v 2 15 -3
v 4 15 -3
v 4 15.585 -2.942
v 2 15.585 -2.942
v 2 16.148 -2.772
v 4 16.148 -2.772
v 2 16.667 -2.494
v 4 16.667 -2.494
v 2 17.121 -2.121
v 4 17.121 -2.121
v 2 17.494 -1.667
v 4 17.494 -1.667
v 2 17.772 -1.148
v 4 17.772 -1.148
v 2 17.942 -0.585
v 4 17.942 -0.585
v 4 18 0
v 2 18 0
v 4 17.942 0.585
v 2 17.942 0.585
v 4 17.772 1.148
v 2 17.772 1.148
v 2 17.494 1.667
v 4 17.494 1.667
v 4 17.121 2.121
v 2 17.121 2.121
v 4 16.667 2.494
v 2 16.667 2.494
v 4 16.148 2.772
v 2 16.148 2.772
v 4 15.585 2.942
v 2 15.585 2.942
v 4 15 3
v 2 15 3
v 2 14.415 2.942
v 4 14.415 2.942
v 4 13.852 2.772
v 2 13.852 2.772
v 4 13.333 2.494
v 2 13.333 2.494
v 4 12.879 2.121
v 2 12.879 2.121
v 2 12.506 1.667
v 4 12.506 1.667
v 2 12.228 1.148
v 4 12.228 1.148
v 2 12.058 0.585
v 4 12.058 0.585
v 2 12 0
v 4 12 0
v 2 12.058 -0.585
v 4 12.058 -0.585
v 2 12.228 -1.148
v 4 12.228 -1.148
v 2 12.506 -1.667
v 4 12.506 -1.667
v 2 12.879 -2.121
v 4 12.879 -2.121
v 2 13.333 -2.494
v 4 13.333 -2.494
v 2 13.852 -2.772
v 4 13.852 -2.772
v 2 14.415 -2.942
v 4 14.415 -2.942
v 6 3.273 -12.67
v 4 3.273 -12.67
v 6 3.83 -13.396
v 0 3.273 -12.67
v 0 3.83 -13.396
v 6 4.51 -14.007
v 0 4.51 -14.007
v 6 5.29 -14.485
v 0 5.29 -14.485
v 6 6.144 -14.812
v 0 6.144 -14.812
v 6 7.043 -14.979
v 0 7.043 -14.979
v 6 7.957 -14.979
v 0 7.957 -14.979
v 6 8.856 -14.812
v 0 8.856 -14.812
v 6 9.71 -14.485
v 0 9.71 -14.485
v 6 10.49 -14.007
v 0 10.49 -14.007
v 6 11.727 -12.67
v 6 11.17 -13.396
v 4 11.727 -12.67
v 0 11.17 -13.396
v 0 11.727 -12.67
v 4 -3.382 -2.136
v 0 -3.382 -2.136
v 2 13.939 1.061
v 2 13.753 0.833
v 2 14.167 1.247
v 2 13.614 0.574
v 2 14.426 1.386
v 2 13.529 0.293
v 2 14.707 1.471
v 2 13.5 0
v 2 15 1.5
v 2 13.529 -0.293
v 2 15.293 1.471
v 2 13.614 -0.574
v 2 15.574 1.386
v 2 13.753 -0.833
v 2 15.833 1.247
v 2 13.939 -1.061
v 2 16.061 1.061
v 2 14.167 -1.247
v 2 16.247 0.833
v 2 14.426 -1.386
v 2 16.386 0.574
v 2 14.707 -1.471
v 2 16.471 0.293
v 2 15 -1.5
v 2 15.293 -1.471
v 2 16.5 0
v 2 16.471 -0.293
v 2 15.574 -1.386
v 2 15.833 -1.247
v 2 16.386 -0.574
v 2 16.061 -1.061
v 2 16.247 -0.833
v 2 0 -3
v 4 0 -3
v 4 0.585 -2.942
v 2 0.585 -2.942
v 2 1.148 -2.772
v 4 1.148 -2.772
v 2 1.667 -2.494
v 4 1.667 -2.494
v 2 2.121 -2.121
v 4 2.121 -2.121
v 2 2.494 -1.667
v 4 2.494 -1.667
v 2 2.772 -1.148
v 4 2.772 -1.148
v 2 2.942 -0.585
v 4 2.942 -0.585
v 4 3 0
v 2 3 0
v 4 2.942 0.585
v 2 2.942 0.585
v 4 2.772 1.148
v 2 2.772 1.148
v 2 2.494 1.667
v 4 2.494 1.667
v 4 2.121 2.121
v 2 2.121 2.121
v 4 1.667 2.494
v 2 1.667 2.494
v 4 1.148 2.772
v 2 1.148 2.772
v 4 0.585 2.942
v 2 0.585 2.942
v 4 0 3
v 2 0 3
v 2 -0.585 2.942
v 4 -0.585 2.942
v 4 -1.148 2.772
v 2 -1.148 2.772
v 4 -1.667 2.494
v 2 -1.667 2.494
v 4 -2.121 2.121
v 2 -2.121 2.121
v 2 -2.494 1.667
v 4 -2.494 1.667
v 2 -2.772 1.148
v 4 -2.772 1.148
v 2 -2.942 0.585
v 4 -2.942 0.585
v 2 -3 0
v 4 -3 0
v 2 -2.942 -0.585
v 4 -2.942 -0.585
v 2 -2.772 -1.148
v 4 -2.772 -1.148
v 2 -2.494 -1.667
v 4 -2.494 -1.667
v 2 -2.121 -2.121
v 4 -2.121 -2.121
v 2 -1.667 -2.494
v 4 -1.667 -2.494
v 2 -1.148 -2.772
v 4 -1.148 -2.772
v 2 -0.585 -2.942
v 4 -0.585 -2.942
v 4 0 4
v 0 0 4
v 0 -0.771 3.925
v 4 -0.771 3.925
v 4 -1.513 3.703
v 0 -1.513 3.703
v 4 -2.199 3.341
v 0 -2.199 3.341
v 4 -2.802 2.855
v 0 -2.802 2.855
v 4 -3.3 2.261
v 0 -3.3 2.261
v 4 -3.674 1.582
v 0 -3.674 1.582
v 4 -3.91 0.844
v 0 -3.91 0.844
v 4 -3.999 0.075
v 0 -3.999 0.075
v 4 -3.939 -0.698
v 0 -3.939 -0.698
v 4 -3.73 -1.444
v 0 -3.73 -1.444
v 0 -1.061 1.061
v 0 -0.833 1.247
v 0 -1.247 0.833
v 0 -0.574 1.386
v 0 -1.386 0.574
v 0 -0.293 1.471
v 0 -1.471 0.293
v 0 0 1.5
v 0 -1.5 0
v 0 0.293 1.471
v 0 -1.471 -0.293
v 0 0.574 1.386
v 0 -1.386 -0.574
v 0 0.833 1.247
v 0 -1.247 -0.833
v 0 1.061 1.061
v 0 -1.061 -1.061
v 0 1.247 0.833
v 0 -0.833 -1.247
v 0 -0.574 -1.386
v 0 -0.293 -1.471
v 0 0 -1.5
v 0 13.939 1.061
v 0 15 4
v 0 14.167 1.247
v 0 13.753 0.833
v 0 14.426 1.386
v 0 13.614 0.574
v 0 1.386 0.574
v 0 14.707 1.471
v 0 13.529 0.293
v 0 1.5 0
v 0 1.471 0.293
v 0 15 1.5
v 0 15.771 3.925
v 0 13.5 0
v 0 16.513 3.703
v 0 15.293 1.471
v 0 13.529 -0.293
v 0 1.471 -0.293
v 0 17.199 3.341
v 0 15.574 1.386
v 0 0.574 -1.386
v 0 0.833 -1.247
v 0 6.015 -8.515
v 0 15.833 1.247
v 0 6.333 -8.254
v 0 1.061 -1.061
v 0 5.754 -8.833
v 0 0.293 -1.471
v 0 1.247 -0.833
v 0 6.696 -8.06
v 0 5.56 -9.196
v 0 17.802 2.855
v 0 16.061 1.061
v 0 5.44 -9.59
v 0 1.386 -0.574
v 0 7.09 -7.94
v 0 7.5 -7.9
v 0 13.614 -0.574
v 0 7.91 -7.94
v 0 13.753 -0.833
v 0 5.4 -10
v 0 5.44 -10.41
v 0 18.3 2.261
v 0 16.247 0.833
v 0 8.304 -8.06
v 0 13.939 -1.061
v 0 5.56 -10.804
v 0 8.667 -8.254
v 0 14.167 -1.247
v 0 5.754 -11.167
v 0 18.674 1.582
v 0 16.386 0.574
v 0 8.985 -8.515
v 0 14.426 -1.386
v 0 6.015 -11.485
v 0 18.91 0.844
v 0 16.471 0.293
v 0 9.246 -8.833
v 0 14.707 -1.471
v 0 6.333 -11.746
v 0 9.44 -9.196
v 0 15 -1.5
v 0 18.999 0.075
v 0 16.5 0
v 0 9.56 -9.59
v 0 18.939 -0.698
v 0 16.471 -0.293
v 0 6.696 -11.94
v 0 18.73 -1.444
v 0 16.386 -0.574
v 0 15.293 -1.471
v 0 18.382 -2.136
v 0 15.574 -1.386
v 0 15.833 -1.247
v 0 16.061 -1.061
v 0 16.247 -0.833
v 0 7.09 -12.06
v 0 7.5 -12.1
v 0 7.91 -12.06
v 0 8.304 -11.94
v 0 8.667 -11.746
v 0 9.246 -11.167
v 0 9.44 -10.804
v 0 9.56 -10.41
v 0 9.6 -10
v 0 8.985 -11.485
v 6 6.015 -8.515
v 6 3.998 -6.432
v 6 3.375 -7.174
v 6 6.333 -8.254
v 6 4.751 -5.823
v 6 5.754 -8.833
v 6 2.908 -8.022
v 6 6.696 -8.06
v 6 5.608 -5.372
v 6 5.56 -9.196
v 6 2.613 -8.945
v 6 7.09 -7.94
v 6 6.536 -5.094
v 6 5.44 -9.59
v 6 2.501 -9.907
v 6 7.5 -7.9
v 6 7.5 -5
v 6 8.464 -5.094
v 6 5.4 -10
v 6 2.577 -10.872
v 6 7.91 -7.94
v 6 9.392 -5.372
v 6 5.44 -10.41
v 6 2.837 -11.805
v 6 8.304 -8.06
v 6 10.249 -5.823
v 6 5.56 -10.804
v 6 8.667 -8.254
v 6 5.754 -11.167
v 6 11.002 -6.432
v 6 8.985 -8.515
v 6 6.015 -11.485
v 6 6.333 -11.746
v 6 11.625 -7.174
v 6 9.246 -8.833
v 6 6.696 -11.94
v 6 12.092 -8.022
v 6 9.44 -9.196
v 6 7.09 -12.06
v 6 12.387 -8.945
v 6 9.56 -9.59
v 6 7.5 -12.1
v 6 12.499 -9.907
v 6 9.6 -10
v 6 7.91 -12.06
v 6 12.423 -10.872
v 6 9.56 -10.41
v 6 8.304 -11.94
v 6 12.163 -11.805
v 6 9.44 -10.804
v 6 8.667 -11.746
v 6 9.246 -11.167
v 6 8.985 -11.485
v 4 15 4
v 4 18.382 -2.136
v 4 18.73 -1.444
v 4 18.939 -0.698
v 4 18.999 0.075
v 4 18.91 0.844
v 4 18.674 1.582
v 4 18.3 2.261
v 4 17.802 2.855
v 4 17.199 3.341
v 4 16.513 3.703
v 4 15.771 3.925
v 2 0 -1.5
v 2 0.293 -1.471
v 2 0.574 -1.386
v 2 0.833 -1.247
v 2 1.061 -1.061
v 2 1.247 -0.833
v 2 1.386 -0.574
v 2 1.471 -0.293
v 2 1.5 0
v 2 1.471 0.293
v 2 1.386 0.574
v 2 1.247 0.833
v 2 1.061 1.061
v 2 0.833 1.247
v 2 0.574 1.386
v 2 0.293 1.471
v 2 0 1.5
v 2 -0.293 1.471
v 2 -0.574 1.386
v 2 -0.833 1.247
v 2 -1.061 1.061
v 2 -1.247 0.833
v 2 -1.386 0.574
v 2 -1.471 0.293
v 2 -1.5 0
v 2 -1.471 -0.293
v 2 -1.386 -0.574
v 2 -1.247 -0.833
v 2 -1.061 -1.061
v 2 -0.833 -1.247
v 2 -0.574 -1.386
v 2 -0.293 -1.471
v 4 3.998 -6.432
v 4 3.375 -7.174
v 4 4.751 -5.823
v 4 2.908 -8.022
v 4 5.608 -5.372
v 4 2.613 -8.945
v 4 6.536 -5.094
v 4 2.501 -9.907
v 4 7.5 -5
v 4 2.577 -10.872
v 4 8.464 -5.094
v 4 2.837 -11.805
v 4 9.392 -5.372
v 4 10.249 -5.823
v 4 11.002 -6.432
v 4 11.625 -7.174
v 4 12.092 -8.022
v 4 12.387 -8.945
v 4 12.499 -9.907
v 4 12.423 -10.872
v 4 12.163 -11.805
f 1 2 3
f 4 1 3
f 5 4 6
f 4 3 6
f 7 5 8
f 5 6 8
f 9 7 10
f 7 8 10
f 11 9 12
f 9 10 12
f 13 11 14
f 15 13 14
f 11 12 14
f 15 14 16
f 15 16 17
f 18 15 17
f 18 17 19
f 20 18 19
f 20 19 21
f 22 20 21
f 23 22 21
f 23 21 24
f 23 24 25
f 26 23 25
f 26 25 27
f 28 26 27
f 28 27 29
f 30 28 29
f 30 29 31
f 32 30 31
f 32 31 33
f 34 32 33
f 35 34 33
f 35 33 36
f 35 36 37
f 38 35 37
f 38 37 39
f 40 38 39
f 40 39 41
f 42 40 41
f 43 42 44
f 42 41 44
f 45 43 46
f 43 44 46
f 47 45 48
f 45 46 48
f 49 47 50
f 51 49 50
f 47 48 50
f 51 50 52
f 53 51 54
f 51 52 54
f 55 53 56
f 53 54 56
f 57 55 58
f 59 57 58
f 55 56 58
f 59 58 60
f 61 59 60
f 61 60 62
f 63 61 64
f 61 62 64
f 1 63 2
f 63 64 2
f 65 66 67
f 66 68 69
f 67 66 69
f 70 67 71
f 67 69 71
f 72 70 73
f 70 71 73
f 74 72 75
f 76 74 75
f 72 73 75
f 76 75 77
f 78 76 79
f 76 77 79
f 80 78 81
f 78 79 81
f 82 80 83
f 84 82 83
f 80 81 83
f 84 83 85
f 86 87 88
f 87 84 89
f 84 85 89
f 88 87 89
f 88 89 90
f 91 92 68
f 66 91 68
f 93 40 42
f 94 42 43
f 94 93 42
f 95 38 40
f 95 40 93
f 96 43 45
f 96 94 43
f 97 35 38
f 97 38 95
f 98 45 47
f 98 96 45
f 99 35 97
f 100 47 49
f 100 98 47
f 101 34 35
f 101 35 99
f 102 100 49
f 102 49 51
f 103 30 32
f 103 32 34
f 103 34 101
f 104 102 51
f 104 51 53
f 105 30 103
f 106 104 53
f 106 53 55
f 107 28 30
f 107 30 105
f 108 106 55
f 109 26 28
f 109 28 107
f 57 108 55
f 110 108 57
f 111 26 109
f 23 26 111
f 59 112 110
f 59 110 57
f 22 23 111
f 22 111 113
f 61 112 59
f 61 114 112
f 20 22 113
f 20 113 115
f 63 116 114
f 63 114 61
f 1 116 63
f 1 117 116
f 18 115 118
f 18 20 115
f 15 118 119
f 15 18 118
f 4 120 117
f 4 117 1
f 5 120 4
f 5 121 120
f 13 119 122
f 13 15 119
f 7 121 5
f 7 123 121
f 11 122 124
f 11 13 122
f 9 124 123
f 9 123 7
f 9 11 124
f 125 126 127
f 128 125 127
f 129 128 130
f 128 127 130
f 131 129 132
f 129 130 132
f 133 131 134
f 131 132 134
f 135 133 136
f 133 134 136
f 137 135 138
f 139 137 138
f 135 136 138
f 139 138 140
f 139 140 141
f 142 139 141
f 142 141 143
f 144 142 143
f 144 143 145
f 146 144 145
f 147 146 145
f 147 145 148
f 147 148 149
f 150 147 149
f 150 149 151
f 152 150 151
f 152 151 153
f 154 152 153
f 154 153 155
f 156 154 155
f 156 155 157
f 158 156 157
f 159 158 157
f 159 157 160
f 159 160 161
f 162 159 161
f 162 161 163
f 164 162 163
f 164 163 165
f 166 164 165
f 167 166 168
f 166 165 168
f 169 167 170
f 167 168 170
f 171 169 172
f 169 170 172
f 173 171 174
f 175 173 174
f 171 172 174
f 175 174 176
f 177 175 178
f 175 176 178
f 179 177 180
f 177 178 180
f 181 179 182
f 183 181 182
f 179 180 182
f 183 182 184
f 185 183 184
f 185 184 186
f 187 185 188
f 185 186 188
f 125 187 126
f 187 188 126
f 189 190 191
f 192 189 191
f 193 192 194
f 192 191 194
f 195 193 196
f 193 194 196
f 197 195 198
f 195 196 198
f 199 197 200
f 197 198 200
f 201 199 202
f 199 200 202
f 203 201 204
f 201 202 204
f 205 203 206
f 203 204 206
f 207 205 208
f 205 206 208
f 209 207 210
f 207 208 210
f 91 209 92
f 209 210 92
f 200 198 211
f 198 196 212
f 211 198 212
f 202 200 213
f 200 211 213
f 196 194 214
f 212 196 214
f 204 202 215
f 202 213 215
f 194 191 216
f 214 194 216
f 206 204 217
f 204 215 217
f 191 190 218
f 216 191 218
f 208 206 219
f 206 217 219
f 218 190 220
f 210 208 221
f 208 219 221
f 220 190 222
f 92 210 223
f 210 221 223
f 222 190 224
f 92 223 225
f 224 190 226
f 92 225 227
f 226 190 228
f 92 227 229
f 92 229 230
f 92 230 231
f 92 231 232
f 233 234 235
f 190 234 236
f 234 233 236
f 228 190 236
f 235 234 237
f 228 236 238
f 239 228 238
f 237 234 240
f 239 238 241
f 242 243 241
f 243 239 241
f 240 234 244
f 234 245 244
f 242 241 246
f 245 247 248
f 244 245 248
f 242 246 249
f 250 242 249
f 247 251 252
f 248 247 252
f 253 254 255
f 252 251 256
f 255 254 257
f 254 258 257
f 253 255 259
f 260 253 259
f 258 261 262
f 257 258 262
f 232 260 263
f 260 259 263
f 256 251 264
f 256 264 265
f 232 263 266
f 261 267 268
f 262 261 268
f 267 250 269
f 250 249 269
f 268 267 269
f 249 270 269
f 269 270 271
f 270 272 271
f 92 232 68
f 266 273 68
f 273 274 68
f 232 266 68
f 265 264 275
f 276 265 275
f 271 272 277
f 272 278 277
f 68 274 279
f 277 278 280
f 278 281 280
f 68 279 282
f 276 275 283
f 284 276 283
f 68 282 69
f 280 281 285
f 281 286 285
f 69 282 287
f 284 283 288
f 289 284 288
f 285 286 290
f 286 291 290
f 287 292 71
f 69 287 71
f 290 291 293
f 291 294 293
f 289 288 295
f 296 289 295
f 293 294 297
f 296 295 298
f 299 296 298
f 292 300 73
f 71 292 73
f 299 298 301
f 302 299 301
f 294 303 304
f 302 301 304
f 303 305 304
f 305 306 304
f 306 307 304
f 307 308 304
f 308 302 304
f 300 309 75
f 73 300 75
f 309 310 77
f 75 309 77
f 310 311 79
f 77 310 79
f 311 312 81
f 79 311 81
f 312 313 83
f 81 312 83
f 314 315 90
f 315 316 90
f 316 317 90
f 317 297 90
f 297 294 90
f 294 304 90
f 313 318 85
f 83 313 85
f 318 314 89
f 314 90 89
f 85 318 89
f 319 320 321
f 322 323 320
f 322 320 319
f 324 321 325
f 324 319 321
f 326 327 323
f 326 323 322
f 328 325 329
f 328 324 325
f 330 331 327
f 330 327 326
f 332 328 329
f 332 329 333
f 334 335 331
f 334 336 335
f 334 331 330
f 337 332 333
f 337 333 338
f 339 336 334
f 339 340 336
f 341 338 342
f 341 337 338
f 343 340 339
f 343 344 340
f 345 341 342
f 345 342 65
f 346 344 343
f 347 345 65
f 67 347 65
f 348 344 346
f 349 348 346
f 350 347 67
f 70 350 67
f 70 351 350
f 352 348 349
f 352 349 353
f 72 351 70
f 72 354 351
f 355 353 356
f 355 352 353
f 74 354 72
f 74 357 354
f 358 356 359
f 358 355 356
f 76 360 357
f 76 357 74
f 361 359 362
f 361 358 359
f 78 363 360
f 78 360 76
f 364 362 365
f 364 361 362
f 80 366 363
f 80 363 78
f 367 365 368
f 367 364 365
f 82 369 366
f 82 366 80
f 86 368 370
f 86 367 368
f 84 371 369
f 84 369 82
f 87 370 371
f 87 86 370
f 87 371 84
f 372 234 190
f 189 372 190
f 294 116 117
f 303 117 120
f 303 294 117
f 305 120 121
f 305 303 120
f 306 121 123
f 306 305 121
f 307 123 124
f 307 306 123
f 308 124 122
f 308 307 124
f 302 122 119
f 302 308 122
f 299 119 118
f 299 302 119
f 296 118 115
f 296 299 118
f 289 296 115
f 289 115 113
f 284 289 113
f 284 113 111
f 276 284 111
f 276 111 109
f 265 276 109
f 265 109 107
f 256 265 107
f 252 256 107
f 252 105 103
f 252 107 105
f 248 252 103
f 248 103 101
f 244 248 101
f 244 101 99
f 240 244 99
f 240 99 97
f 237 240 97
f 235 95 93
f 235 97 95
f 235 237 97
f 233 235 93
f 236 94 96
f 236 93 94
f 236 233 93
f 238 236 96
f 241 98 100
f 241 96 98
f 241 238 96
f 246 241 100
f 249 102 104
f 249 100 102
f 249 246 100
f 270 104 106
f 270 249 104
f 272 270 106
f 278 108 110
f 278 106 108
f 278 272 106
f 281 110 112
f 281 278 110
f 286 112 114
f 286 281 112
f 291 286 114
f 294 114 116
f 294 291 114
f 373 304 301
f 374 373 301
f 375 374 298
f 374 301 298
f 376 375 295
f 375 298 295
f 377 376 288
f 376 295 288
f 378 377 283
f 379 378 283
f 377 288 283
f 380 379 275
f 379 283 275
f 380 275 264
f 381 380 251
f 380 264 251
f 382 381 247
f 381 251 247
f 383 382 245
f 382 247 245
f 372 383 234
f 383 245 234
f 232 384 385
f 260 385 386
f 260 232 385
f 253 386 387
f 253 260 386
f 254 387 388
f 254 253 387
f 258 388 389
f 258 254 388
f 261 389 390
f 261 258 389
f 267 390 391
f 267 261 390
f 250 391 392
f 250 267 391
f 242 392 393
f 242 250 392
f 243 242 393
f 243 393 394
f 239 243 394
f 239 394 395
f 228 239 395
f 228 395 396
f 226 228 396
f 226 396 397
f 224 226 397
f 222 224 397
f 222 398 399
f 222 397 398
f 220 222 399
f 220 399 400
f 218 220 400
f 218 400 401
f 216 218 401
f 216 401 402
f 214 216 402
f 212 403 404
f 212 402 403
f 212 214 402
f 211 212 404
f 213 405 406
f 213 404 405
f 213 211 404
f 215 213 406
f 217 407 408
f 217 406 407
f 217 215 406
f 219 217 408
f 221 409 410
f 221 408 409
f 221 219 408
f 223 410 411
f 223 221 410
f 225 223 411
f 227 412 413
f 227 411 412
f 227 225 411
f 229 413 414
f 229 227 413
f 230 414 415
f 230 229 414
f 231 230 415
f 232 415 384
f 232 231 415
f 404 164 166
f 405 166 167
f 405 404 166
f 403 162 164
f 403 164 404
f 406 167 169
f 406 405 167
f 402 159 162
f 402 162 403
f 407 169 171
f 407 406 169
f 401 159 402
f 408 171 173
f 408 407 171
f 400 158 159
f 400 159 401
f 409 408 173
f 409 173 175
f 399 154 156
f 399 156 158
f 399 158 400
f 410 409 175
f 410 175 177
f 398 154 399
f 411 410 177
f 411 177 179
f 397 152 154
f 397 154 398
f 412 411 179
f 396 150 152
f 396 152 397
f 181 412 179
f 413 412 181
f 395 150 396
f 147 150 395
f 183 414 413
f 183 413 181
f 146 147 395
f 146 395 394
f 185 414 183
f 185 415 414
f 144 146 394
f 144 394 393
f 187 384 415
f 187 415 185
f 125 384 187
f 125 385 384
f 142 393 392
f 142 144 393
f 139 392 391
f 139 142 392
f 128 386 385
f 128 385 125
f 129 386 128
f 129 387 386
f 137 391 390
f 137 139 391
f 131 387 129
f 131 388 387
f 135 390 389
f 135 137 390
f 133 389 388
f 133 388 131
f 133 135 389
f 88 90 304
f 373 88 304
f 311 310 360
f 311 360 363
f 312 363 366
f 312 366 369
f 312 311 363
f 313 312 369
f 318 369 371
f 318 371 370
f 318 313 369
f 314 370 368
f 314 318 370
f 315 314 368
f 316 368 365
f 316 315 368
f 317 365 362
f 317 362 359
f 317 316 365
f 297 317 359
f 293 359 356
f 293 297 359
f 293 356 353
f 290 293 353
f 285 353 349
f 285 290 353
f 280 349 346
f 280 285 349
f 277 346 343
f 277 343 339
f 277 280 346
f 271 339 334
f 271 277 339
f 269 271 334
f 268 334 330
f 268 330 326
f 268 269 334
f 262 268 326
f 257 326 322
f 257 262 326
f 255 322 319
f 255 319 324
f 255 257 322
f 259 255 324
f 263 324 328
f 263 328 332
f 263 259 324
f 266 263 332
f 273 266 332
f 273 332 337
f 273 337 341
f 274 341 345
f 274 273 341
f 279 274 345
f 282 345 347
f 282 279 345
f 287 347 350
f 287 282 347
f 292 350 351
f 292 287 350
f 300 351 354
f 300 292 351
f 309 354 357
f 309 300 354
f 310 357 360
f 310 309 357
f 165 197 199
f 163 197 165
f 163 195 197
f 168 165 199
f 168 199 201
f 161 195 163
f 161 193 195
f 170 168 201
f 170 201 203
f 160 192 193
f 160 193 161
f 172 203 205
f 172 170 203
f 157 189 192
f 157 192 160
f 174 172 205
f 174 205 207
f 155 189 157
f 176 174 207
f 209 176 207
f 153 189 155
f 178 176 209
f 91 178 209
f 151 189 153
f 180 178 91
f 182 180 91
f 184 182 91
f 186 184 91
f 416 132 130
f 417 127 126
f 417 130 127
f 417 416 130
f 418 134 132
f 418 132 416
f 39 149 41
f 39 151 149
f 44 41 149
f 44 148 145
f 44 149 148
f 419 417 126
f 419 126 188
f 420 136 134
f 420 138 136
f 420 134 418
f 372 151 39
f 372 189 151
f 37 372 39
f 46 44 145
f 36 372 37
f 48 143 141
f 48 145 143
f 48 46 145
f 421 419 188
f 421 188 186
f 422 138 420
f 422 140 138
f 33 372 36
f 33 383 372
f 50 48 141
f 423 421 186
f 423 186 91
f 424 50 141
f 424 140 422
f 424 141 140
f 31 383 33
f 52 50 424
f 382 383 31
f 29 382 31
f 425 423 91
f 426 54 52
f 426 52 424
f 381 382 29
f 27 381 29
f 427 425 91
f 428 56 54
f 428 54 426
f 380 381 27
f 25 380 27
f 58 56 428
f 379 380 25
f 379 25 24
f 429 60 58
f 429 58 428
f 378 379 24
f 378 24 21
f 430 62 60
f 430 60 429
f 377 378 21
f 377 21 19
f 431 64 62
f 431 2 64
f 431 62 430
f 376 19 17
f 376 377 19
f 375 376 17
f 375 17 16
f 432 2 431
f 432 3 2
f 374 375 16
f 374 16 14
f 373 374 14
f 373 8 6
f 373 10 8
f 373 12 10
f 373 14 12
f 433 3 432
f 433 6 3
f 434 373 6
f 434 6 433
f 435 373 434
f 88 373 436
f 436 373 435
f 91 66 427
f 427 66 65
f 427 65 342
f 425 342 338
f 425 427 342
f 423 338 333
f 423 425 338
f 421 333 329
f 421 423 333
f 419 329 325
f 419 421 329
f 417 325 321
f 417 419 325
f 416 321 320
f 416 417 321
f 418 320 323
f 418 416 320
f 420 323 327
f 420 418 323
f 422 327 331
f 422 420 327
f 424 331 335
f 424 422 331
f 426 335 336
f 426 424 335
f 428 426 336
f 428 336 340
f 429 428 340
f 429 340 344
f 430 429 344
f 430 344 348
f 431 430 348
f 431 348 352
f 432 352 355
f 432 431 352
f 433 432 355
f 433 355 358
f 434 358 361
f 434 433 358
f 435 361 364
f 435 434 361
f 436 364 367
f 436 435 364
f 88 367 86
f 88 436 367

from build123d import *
from build123d.topology import SkipClean

# Parameters (mm, degrees)
SKETCH_1_R          = 1.5
SKETCH_1_R_2        = 2.1
EXTRUDE_1_DEPTH     = 6
SKETCH_2_R          = 3
CUT_EXTRUDE_1_DEPTH = 3
SKETCH_3_R          = 3
CUT_EXTRUDE_2_DEPTH = 1
CUT_EXTRUDE_START   = -2
SKETCH_4_R          = 3
CUT_EXTRUDE_3_DEPTH = 2


with BuildPart() as part:
    # 草图1 → 凸台-拉伸1 (new body)
    with BuildSketch(Plane(origin=(0, 0, 0), x_dir=(0, 0, -1), z_dir=(1, 0, 0))):
        with BuildLine():
            Line((-4, 15), (-4, 0))
            ThreePointArc((-4, 0), (-1.930643586, -3.503229274), (2.136307673, -3.381743563))
            Line((2.136307673, -3.381743563), (12.670384591, 3.272820546))
            ThreePointArc((12.670384591, 3.272820546), (15, 7.5), (12.670384591, 11.727179454))
            Line((12.670384591, 11.727179454), (2.136307673, 18.381743563))
            ThreePointArc((2.136307673, 18.381743563), (-1.930643586, 18.503229274), (-4, 15))
        make_face()
        Circle(SKETCH_1_R, mode=Mode.SUBTRACT)
        with Locations((0, 15)):
            Circle(SKETCH_1_R, mode=Mode.SUBTRACT)
        with Locations((10, 7.5)):
            Circle(SKETCH_1_R_2, mode=Mode.SUBTRACT)
    extrude(amount=EXTRUDE_1_DEPTH)

    # 草图2 → 切除-拉伸1 (cut)
    with BuildSketch(Plane(origin=(6, 0, 0), x_dir=(0, 0, -1), z_dir=(1, 0, 0))):
        with Locations((0, 15)):
            Circle(SKETCH_2_R)
        Circle(SKETCH_2_R)
    extrude(amount=-CUT_EXTRUDE_1_DEPTH, mode=Mode.SUBTRACT)

    # 草图3 → 切除-拉伸2 (cut)
    with BuildSketch(Plane(origin=(3, 0, 0), x_dir=(0, 0, -1), z_dir=(1, 0, 0))):
        Circle(SKETCH_3_R)
        with Locations((0, 15)):
            Circle(SKETCH_3_R)
    extrude(amount=-CUT_EXTRUDE_2_DEPTH, mode=Mode.SUBTRACT)

    # 草图4 → 切除-拉伸3 (cut)
    with SkipClean():  # the faces are left unmerged after this step: merging them gives an invalid solid
        with BuildSketch(Plane(origin=(6, 0, 0), x_dir=(0, 0, -1), z_dir=(1, 0, 0)).offset(CUT_EXTRUDE_START)):
            with BuildLine():
                ThreePointArc((12.670384591, 3.272820546), (5, 7.5), (12.670384591, 11.727179454))
                Line((12.670384591, 11.727179454), (2.136307673, 18.381743563))
                ThreePointArc((2.136307673, 18.381743563), (-1.930643586, 18.503229274), (-4, 15))
                Line((-4, 15), (-4, 0))
                ThreePointArc((-4, 0), (-1.930643586, -3.503229274), (2.136307673, -3.381743563))
                Line((2.136307673, -3.381743563), (12.670384591, 3.272820546))
            make_face()
            Circle(SKETCH_4_R, mode=Mode.SUBTRACT)
            with Locations((0, 15)):
                Circle(SKETCH_4_R, mode=Mode.SUBTRACT)
        extrude(amount=CUT_EXTRUDE_3_DEPTH, mode=Mode.SUBTRACT)


solid = part.part
